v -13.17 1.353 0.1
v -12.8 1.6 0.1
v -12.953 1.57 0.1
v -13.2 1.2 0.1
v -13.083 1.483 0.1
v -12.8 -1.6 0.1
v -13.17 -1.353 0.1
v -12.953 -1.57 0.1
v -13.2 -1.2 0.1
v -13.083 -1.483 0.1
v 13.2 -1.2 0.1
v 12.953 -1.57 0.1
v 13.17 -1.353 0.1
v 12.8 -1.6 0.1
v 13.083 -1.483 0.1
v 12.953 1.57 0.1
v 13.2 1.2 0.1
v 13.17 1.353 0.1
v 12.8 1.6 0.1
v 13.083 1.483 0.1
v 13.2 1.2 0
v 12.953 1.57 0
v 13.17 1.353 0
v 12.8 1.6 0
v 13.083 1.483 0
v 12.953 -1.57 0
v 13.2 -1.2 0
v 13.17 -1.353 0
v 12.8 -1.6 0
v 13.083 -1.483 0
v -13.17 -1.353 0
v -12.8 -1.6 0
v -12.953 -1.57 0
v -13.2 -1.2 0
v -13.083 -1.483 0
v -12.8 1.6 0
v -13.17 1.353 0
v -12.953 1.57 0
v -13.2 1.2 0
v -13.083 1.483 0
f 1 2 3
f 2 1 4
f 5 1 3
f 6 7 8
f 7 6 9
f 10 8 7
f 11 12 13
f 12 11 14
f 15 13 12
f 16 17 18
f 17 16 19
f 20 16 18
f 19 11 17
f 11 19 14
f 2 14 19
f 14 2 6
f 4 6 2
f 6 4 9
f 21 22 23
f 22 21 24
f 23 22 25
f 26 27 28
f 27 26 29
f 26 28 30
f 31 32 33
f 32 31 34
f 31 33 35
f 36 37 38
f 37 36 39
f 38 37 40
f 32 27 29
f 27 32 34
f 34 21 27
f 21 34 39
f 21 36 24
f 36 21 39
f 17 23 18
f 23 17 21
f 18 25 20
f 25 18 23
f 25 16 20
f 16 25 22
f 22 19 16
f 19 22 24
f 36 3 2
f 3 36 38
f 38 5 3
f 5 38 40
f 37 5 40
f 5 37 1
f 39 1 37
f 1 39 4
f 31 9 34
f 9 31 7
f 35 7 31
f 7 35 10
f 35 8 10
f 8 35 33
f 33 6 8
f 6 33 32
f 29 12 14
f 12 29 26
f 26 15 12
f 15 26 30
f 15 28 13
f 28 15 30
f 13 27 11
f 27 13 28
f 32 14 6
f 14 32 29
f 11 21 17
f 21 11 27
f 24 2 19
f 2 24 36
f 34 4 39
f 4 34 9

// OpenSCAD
// file: ../p/1-4cyli.scad
use <../lib.scad>
function ldraw_lib__1_4cyli() = [
// 0 Cylinder 0.25
// 0 Name: 1-4cyli.dat
// 0 Author: James Jessiman
// 0 !LDRAW_ORG Primitive UPDATE 2012-01
// 0 !LICENSE Licensed under CC BY 4.0 : see CAreadme.txt
// 
// 0 BFC CERTIFY CCW
  [0,"BFC","CERTIFY"],
  [0,"BFC","CCW"],
// 
// 0 !HISTORY 2002-03-23 [sbliss] Added BFC statement.
// 0 !HISTORY 2002-04-25 [PTadmin] Official Update 2002-02
// 0 !HISTORY 2007-06-22 [PTadmin] Header formatted for Contributor Agreement
// 0 !HISTORY 2008-07-01 [PTadmin] Official Update 2008-01
// 0 !HISTORY 2012-02-16 [Philo] Changed to CCW
// 0 !HISTORY 2012-03-30 [PTadmin] Official Update 2012-01
// 
// 
// 4 16 1 1 0 0.9239 1 0.3827 0.9239 0 0.3827 1 0 0
  [4,16,1,1,0,0.9239,1,0.3827,0.9239,0,0.3827,1,0,0],
// 5 24 1 0 0 1 1 0 0.9239 0 0.3827 1 0 -1
  [5,24,1,0,0,1,1,0,0.9239,0,0.3827,1,0,-1],
// 4 16 0.9239 1 0.3827 0.7071 1 0.7071 0.7071 0 0.7071 0.9239 0 0.3827
  [4,16,0.9239,1,0.3827,0.7071,1,0.7071,0.7071,0,0.7071,0.9239,0,0.3827],
// 5 24 0.9239 0 0.3827 0.9239 1 0.3827 0.7071 0 0.7071 1 0 0
  [5,24,0.9239,0,0.3827,0.9239,1,0.3827,0.7071,0,0.7071,1,0,0],
// 4 16 0.7071 1 0.7071 0.3827 1 0.9239 0.3827 0 0.9239 0.7071 0 0.7071
  [4,16,0.7071,1,0.7071,0.3827,1,0.9239,0.3827,0,0.9239,0.7071,0,0.7071],
// 5 24 0.7071 0 0.7071 0.7071 1 0.7071 0.3827 0 0.9239 0.9239 0 0.3827
  [5,24,0.7071,0,0.7071,0.7071,1,0.7071,0.3827,0,0.9239,0.9239,0,0.3827],
// 4 16 0.3827 1 0.9239 0 1 1 0 0 1 0.3827 0 0.9239
  [4,16,0.3827,1,0.9239,0,1,1,0,0,1,0.3827,0,0.9239],
// 5 24 0.3827 0 0.9239 0.3827 1 0.9239 0 0 1 0.7071 0 0.7071
  [5,24,0.3827,0,0.9239,0.3827,1,0.9239,0,0,1,0.7071,0,0.7071],
// 5 24 0 0 1 0 1 1 0.3827 0 0.9239 -1 0 1
  [5,24,0,0,1,0,1,1,0.3827,0,0.9239,-1,0,1],
];
module ldraw_lib__1_4cyli(step=0, col=false, unit=2/5, alt=false, line=0.2, solid=!$preview)
    makepoly(ldraw_lib__1_4cyli(), step=step, col=col, unit=unit, alt=alt, line=line, solid=solid);
ldraw_lib__1_4cyli(line=0.2);
// file: ../p/1-4chrd.scad
use <../lib.scad>
function ldraw_lib__1_4chrd() = [
// 0 Chord 0.25
// 0 Name: 1-4chrd.dat
// 0 Author: Max Martin Richter [MMR1988]
// 0 !LDRAW_ORG Primitive UPDATE 2023-05
// 0 !LICENSE Licensed under CC BY 4.0 : see CAreadme.txt
// 
// 0 BFC CERTIFY CCW
  [0,"BFC","CERTIFY"],
  [0,"BFC","CCW"],
// 
// 0 !HISTORY 2004-04-22 [PTadmin] Official Update 2004-02
// 0 !HISTORY 2007-10-09 [PTadmin] Header formatted for Contributor Agreement
// 0 !HISTORY 2008-07-01 [PTadmin] Official Update 2008-01
// 0 !HISTORY 2012-08-02 [MMR1988] Re-creation with PrimGen2 and Rectifier
// 0 !HISTORY 2012-08-09 [PTadmin] Official Update 2012-02
// 0 !HISTORY 2023-10-27 [OrionP] Change author to MMR1988 from hafhead
// 0 !HISTORY 2023-10-31 [OrionP] Official Update 2023-05
// 
// 4 16 0.9239 0 0.3827 0.3827 0 0.9239 0 0 1 1 0 0
  [4,16,0.9239,0,0.3827,0.3827,0,0.9239,0,0,1,1,0,0],
// 3 16 0.7071 0 0.7071 0.3827 0 0.9239 0.9239 0 0.3827
  [3,16,0.7071,0,0.7071,0.3827,0,0.9239,0.9239,0,0.3827],
];
module ldraw_lib__1_4chrd(step=0, col=false, unit=2/5, alt=false, line=0.2, solid=!$preview)
    makepoly(ldraw_lib__1_4chrd(), step=step, col=col, unit=unit, alt=alt, line=line, solid=solid);
ldraw_lib__1_4chrd(line=0.2);
// main file
use <../lib.scad>
use <../p/1-4chrd.scad>
use <../p/1-4cyli.scad>
function ldraw_lib__6196575j() = [
// 0 Sticker  0.4 x  3.3 Red
// 0 Name: 6196575j.dat
// 0 Author: Evert-Jan Boer [ejboer]
// 0 !LDRAW_ORG Part UPDATE 2024-08
// 0 !LICENSE Licensed under CC BY 4.0 : see CAreadme.txt
// 
// 0 BFC CERTIFY CCW
  [0,"BFC","CERTIFY"],
  [0,"BFC","CCW"],
// 
// 0 !KEYWORDS London Bus, set 10258
// 
// 0 !HISTORY 2024-09-30 [OrionP] Official Update 2024-08
// 
// 1 4 -32 -.25 3 0 0 -1 0 1 0 1 0 0 1-4chrd.dat
  [1,4,-32,-.25,3,0,0,-1,0,1,0,1,0,0, ldraw_lib__1_4chrd()],
// 1 4 -32 -.25 -3 -1 0 0 0 1 0 0 0 -1 1-4chrd.dat
  [1,4,-32,-.25,-3,-1,0,0,0,1,0,0,0,-1, ldraw_lib__1_4chrd()],
// 1 4 32 -.25 -3 0 0 1 0 1 0 -1 0 0 1-4chrd.dat
  [1,4,32,-.25,-3,0,0,1,0,1,0,-1,0,0, ldraw_lib__1_4chrd()],
// 1 4 32 -.25 3 1 0 0 0 1 0 0 0 1 1-4chrd.dat
  [1,4,32,-.25,3,1,0,0,0,1,0,0,0,1, ldraw_lib__1_4chrd()],
// 4 4 32 -.25 -4 33 -.25 -3 33 -.25 3 32 -.25 4
  [4,4,32,-.25,-4,33,-.25,-3,33,-.25,3,32,-.25,4],
// 4 4 -32 -.25 -4 32 -.25 -4 32 -.25 4 -32 -.25 4
  [4,4,-32,-.25,-4,32,-.25,-4,32,-.25,4,-32,-.25,4],
// 4 4 -33 -.25 -3 -32 -.25 -4 -32 -.25 4 -33 -.25 3
  [4,4,-33,-.25,-3,-32,-.25,-4,-32,-.25,4,-33,-.25,3],
// 
// 1 16 32 0 3 1 0 0 0 -1 0 0 0 1 1-4chrd.dat
  [1,16,32,0,3,1,0,0,0,-1,0,0,0,1, ldraw_lib__1_4chrd()],
// 1 16 32 0 -3 0 0 1 0 -1 0 -1 0 0 1-4chrd.dat
  [1,16,32,0,-3,0,0,1,0,-1,0,-1,0,0, ldraw_lib__1_4chrd()],
// 1 16 -32 0 -3 -1 0 0 0 -1 0 0 0 -1 1-4chrd.dat
  [1,16,-32,0,-3,-1,0,0,0,-1,0,0,0,-1, ldraw_lib__1_4chrd()],
// 1 16 -32 0 3 0 0 -1 0 -1 0 1 0 0 1-4chrd.dat
  [1,16,-32,0,3,0,0,-1,0,-1,0,1,0,0, ldraw_lib__1_4chrd()],
// 4 16 32 0 -4 -32 0 -4 -33 0 -3 33 0 -3
  [4,16,32,0,-4,-32,0,-4,-33,0,-3,33,0,-3],
// 4 16 33 0 3 33 0 -3 -33 0 -3 -33 0 3
  [4,16,33,0,3,33,0,-3,-33,0,-3,-33,0,3],
// 4 16 33 0 3 -33 0 3 -32 0 4 32 0 4
  [4,16,33,0,3,-33,0,3,-32,0,4,32,0,4],
// 
// 1 16 32 -.25 3 1 0 0 0 .25 0 0 0 1 1-4cyli.dat
  [1,16,32,-.25,3,1,0,0,0,.25,0,0,0,1, ldraw_lib__1_4cyli()],
// 1 16 -32 -.25 3 0 0 -1 0 .25 0 1 0 0 1-4cyli.dat
  [1,16,-32,-.25,3,0,0,-1,0,.25,0,1,0,0, ldraw_lib__1_4cyli()],
// 1 16 -32 -.25 -3 -1 0 0 0 .25 0 0 0 -1 1-4cyli.dat
  [1,16,-32,-.25,-3,-1,0,0,0,.25,0,0,0,-1, ldraw_lib__1_4cyli()],
// 1 16 32 -.25 -3 0 0 1 0 .25 0 -1 0 0 1-4cyli.dat
  [1,16,32,-.25,-3,0,0,1,0,.25,0,-1,0,0, ldraw_lib__1_4cyli()],
// 4 16 32 -.25 -4 -32 -.25 -4 -32 0 -4 32 0 -4
  [4,16,32,-.25,-4,-32,-.25,-4,-32,0,-4,32,0,-4],
// 4 16 33 -.25 3 33 -.25 -3 33 0 -3 33 0 3
  [4,16,33,-.25,3,33,-.25,-3,33,0,-3,33,0,3],
// 4 16 -32 -.25 4 32 -.25 4 32 0 4 -32 0 4
  [4,16,-32,-.25,4,32,-.25,4,32,0,4,-32,0,4],
// 4 16 -33 -.25 -3 -33 -.25 3 -33 0 3 -33 0 -3
  [4,16,-33,-.25,-3,-33,-.25,3,-33,0,3,-33,0,-3],
];
module ldraw_lib__6196575j(step=0, col=false, unit=2/5, alt=false, line=0.2, solid=!$preview)
    makepoly(ldraw_lib__6196575j(), step=step, col=col, unit=unit, alt=alt, line=line, solid=solid);
ldraw_lib__6196575j(line=0.2);
